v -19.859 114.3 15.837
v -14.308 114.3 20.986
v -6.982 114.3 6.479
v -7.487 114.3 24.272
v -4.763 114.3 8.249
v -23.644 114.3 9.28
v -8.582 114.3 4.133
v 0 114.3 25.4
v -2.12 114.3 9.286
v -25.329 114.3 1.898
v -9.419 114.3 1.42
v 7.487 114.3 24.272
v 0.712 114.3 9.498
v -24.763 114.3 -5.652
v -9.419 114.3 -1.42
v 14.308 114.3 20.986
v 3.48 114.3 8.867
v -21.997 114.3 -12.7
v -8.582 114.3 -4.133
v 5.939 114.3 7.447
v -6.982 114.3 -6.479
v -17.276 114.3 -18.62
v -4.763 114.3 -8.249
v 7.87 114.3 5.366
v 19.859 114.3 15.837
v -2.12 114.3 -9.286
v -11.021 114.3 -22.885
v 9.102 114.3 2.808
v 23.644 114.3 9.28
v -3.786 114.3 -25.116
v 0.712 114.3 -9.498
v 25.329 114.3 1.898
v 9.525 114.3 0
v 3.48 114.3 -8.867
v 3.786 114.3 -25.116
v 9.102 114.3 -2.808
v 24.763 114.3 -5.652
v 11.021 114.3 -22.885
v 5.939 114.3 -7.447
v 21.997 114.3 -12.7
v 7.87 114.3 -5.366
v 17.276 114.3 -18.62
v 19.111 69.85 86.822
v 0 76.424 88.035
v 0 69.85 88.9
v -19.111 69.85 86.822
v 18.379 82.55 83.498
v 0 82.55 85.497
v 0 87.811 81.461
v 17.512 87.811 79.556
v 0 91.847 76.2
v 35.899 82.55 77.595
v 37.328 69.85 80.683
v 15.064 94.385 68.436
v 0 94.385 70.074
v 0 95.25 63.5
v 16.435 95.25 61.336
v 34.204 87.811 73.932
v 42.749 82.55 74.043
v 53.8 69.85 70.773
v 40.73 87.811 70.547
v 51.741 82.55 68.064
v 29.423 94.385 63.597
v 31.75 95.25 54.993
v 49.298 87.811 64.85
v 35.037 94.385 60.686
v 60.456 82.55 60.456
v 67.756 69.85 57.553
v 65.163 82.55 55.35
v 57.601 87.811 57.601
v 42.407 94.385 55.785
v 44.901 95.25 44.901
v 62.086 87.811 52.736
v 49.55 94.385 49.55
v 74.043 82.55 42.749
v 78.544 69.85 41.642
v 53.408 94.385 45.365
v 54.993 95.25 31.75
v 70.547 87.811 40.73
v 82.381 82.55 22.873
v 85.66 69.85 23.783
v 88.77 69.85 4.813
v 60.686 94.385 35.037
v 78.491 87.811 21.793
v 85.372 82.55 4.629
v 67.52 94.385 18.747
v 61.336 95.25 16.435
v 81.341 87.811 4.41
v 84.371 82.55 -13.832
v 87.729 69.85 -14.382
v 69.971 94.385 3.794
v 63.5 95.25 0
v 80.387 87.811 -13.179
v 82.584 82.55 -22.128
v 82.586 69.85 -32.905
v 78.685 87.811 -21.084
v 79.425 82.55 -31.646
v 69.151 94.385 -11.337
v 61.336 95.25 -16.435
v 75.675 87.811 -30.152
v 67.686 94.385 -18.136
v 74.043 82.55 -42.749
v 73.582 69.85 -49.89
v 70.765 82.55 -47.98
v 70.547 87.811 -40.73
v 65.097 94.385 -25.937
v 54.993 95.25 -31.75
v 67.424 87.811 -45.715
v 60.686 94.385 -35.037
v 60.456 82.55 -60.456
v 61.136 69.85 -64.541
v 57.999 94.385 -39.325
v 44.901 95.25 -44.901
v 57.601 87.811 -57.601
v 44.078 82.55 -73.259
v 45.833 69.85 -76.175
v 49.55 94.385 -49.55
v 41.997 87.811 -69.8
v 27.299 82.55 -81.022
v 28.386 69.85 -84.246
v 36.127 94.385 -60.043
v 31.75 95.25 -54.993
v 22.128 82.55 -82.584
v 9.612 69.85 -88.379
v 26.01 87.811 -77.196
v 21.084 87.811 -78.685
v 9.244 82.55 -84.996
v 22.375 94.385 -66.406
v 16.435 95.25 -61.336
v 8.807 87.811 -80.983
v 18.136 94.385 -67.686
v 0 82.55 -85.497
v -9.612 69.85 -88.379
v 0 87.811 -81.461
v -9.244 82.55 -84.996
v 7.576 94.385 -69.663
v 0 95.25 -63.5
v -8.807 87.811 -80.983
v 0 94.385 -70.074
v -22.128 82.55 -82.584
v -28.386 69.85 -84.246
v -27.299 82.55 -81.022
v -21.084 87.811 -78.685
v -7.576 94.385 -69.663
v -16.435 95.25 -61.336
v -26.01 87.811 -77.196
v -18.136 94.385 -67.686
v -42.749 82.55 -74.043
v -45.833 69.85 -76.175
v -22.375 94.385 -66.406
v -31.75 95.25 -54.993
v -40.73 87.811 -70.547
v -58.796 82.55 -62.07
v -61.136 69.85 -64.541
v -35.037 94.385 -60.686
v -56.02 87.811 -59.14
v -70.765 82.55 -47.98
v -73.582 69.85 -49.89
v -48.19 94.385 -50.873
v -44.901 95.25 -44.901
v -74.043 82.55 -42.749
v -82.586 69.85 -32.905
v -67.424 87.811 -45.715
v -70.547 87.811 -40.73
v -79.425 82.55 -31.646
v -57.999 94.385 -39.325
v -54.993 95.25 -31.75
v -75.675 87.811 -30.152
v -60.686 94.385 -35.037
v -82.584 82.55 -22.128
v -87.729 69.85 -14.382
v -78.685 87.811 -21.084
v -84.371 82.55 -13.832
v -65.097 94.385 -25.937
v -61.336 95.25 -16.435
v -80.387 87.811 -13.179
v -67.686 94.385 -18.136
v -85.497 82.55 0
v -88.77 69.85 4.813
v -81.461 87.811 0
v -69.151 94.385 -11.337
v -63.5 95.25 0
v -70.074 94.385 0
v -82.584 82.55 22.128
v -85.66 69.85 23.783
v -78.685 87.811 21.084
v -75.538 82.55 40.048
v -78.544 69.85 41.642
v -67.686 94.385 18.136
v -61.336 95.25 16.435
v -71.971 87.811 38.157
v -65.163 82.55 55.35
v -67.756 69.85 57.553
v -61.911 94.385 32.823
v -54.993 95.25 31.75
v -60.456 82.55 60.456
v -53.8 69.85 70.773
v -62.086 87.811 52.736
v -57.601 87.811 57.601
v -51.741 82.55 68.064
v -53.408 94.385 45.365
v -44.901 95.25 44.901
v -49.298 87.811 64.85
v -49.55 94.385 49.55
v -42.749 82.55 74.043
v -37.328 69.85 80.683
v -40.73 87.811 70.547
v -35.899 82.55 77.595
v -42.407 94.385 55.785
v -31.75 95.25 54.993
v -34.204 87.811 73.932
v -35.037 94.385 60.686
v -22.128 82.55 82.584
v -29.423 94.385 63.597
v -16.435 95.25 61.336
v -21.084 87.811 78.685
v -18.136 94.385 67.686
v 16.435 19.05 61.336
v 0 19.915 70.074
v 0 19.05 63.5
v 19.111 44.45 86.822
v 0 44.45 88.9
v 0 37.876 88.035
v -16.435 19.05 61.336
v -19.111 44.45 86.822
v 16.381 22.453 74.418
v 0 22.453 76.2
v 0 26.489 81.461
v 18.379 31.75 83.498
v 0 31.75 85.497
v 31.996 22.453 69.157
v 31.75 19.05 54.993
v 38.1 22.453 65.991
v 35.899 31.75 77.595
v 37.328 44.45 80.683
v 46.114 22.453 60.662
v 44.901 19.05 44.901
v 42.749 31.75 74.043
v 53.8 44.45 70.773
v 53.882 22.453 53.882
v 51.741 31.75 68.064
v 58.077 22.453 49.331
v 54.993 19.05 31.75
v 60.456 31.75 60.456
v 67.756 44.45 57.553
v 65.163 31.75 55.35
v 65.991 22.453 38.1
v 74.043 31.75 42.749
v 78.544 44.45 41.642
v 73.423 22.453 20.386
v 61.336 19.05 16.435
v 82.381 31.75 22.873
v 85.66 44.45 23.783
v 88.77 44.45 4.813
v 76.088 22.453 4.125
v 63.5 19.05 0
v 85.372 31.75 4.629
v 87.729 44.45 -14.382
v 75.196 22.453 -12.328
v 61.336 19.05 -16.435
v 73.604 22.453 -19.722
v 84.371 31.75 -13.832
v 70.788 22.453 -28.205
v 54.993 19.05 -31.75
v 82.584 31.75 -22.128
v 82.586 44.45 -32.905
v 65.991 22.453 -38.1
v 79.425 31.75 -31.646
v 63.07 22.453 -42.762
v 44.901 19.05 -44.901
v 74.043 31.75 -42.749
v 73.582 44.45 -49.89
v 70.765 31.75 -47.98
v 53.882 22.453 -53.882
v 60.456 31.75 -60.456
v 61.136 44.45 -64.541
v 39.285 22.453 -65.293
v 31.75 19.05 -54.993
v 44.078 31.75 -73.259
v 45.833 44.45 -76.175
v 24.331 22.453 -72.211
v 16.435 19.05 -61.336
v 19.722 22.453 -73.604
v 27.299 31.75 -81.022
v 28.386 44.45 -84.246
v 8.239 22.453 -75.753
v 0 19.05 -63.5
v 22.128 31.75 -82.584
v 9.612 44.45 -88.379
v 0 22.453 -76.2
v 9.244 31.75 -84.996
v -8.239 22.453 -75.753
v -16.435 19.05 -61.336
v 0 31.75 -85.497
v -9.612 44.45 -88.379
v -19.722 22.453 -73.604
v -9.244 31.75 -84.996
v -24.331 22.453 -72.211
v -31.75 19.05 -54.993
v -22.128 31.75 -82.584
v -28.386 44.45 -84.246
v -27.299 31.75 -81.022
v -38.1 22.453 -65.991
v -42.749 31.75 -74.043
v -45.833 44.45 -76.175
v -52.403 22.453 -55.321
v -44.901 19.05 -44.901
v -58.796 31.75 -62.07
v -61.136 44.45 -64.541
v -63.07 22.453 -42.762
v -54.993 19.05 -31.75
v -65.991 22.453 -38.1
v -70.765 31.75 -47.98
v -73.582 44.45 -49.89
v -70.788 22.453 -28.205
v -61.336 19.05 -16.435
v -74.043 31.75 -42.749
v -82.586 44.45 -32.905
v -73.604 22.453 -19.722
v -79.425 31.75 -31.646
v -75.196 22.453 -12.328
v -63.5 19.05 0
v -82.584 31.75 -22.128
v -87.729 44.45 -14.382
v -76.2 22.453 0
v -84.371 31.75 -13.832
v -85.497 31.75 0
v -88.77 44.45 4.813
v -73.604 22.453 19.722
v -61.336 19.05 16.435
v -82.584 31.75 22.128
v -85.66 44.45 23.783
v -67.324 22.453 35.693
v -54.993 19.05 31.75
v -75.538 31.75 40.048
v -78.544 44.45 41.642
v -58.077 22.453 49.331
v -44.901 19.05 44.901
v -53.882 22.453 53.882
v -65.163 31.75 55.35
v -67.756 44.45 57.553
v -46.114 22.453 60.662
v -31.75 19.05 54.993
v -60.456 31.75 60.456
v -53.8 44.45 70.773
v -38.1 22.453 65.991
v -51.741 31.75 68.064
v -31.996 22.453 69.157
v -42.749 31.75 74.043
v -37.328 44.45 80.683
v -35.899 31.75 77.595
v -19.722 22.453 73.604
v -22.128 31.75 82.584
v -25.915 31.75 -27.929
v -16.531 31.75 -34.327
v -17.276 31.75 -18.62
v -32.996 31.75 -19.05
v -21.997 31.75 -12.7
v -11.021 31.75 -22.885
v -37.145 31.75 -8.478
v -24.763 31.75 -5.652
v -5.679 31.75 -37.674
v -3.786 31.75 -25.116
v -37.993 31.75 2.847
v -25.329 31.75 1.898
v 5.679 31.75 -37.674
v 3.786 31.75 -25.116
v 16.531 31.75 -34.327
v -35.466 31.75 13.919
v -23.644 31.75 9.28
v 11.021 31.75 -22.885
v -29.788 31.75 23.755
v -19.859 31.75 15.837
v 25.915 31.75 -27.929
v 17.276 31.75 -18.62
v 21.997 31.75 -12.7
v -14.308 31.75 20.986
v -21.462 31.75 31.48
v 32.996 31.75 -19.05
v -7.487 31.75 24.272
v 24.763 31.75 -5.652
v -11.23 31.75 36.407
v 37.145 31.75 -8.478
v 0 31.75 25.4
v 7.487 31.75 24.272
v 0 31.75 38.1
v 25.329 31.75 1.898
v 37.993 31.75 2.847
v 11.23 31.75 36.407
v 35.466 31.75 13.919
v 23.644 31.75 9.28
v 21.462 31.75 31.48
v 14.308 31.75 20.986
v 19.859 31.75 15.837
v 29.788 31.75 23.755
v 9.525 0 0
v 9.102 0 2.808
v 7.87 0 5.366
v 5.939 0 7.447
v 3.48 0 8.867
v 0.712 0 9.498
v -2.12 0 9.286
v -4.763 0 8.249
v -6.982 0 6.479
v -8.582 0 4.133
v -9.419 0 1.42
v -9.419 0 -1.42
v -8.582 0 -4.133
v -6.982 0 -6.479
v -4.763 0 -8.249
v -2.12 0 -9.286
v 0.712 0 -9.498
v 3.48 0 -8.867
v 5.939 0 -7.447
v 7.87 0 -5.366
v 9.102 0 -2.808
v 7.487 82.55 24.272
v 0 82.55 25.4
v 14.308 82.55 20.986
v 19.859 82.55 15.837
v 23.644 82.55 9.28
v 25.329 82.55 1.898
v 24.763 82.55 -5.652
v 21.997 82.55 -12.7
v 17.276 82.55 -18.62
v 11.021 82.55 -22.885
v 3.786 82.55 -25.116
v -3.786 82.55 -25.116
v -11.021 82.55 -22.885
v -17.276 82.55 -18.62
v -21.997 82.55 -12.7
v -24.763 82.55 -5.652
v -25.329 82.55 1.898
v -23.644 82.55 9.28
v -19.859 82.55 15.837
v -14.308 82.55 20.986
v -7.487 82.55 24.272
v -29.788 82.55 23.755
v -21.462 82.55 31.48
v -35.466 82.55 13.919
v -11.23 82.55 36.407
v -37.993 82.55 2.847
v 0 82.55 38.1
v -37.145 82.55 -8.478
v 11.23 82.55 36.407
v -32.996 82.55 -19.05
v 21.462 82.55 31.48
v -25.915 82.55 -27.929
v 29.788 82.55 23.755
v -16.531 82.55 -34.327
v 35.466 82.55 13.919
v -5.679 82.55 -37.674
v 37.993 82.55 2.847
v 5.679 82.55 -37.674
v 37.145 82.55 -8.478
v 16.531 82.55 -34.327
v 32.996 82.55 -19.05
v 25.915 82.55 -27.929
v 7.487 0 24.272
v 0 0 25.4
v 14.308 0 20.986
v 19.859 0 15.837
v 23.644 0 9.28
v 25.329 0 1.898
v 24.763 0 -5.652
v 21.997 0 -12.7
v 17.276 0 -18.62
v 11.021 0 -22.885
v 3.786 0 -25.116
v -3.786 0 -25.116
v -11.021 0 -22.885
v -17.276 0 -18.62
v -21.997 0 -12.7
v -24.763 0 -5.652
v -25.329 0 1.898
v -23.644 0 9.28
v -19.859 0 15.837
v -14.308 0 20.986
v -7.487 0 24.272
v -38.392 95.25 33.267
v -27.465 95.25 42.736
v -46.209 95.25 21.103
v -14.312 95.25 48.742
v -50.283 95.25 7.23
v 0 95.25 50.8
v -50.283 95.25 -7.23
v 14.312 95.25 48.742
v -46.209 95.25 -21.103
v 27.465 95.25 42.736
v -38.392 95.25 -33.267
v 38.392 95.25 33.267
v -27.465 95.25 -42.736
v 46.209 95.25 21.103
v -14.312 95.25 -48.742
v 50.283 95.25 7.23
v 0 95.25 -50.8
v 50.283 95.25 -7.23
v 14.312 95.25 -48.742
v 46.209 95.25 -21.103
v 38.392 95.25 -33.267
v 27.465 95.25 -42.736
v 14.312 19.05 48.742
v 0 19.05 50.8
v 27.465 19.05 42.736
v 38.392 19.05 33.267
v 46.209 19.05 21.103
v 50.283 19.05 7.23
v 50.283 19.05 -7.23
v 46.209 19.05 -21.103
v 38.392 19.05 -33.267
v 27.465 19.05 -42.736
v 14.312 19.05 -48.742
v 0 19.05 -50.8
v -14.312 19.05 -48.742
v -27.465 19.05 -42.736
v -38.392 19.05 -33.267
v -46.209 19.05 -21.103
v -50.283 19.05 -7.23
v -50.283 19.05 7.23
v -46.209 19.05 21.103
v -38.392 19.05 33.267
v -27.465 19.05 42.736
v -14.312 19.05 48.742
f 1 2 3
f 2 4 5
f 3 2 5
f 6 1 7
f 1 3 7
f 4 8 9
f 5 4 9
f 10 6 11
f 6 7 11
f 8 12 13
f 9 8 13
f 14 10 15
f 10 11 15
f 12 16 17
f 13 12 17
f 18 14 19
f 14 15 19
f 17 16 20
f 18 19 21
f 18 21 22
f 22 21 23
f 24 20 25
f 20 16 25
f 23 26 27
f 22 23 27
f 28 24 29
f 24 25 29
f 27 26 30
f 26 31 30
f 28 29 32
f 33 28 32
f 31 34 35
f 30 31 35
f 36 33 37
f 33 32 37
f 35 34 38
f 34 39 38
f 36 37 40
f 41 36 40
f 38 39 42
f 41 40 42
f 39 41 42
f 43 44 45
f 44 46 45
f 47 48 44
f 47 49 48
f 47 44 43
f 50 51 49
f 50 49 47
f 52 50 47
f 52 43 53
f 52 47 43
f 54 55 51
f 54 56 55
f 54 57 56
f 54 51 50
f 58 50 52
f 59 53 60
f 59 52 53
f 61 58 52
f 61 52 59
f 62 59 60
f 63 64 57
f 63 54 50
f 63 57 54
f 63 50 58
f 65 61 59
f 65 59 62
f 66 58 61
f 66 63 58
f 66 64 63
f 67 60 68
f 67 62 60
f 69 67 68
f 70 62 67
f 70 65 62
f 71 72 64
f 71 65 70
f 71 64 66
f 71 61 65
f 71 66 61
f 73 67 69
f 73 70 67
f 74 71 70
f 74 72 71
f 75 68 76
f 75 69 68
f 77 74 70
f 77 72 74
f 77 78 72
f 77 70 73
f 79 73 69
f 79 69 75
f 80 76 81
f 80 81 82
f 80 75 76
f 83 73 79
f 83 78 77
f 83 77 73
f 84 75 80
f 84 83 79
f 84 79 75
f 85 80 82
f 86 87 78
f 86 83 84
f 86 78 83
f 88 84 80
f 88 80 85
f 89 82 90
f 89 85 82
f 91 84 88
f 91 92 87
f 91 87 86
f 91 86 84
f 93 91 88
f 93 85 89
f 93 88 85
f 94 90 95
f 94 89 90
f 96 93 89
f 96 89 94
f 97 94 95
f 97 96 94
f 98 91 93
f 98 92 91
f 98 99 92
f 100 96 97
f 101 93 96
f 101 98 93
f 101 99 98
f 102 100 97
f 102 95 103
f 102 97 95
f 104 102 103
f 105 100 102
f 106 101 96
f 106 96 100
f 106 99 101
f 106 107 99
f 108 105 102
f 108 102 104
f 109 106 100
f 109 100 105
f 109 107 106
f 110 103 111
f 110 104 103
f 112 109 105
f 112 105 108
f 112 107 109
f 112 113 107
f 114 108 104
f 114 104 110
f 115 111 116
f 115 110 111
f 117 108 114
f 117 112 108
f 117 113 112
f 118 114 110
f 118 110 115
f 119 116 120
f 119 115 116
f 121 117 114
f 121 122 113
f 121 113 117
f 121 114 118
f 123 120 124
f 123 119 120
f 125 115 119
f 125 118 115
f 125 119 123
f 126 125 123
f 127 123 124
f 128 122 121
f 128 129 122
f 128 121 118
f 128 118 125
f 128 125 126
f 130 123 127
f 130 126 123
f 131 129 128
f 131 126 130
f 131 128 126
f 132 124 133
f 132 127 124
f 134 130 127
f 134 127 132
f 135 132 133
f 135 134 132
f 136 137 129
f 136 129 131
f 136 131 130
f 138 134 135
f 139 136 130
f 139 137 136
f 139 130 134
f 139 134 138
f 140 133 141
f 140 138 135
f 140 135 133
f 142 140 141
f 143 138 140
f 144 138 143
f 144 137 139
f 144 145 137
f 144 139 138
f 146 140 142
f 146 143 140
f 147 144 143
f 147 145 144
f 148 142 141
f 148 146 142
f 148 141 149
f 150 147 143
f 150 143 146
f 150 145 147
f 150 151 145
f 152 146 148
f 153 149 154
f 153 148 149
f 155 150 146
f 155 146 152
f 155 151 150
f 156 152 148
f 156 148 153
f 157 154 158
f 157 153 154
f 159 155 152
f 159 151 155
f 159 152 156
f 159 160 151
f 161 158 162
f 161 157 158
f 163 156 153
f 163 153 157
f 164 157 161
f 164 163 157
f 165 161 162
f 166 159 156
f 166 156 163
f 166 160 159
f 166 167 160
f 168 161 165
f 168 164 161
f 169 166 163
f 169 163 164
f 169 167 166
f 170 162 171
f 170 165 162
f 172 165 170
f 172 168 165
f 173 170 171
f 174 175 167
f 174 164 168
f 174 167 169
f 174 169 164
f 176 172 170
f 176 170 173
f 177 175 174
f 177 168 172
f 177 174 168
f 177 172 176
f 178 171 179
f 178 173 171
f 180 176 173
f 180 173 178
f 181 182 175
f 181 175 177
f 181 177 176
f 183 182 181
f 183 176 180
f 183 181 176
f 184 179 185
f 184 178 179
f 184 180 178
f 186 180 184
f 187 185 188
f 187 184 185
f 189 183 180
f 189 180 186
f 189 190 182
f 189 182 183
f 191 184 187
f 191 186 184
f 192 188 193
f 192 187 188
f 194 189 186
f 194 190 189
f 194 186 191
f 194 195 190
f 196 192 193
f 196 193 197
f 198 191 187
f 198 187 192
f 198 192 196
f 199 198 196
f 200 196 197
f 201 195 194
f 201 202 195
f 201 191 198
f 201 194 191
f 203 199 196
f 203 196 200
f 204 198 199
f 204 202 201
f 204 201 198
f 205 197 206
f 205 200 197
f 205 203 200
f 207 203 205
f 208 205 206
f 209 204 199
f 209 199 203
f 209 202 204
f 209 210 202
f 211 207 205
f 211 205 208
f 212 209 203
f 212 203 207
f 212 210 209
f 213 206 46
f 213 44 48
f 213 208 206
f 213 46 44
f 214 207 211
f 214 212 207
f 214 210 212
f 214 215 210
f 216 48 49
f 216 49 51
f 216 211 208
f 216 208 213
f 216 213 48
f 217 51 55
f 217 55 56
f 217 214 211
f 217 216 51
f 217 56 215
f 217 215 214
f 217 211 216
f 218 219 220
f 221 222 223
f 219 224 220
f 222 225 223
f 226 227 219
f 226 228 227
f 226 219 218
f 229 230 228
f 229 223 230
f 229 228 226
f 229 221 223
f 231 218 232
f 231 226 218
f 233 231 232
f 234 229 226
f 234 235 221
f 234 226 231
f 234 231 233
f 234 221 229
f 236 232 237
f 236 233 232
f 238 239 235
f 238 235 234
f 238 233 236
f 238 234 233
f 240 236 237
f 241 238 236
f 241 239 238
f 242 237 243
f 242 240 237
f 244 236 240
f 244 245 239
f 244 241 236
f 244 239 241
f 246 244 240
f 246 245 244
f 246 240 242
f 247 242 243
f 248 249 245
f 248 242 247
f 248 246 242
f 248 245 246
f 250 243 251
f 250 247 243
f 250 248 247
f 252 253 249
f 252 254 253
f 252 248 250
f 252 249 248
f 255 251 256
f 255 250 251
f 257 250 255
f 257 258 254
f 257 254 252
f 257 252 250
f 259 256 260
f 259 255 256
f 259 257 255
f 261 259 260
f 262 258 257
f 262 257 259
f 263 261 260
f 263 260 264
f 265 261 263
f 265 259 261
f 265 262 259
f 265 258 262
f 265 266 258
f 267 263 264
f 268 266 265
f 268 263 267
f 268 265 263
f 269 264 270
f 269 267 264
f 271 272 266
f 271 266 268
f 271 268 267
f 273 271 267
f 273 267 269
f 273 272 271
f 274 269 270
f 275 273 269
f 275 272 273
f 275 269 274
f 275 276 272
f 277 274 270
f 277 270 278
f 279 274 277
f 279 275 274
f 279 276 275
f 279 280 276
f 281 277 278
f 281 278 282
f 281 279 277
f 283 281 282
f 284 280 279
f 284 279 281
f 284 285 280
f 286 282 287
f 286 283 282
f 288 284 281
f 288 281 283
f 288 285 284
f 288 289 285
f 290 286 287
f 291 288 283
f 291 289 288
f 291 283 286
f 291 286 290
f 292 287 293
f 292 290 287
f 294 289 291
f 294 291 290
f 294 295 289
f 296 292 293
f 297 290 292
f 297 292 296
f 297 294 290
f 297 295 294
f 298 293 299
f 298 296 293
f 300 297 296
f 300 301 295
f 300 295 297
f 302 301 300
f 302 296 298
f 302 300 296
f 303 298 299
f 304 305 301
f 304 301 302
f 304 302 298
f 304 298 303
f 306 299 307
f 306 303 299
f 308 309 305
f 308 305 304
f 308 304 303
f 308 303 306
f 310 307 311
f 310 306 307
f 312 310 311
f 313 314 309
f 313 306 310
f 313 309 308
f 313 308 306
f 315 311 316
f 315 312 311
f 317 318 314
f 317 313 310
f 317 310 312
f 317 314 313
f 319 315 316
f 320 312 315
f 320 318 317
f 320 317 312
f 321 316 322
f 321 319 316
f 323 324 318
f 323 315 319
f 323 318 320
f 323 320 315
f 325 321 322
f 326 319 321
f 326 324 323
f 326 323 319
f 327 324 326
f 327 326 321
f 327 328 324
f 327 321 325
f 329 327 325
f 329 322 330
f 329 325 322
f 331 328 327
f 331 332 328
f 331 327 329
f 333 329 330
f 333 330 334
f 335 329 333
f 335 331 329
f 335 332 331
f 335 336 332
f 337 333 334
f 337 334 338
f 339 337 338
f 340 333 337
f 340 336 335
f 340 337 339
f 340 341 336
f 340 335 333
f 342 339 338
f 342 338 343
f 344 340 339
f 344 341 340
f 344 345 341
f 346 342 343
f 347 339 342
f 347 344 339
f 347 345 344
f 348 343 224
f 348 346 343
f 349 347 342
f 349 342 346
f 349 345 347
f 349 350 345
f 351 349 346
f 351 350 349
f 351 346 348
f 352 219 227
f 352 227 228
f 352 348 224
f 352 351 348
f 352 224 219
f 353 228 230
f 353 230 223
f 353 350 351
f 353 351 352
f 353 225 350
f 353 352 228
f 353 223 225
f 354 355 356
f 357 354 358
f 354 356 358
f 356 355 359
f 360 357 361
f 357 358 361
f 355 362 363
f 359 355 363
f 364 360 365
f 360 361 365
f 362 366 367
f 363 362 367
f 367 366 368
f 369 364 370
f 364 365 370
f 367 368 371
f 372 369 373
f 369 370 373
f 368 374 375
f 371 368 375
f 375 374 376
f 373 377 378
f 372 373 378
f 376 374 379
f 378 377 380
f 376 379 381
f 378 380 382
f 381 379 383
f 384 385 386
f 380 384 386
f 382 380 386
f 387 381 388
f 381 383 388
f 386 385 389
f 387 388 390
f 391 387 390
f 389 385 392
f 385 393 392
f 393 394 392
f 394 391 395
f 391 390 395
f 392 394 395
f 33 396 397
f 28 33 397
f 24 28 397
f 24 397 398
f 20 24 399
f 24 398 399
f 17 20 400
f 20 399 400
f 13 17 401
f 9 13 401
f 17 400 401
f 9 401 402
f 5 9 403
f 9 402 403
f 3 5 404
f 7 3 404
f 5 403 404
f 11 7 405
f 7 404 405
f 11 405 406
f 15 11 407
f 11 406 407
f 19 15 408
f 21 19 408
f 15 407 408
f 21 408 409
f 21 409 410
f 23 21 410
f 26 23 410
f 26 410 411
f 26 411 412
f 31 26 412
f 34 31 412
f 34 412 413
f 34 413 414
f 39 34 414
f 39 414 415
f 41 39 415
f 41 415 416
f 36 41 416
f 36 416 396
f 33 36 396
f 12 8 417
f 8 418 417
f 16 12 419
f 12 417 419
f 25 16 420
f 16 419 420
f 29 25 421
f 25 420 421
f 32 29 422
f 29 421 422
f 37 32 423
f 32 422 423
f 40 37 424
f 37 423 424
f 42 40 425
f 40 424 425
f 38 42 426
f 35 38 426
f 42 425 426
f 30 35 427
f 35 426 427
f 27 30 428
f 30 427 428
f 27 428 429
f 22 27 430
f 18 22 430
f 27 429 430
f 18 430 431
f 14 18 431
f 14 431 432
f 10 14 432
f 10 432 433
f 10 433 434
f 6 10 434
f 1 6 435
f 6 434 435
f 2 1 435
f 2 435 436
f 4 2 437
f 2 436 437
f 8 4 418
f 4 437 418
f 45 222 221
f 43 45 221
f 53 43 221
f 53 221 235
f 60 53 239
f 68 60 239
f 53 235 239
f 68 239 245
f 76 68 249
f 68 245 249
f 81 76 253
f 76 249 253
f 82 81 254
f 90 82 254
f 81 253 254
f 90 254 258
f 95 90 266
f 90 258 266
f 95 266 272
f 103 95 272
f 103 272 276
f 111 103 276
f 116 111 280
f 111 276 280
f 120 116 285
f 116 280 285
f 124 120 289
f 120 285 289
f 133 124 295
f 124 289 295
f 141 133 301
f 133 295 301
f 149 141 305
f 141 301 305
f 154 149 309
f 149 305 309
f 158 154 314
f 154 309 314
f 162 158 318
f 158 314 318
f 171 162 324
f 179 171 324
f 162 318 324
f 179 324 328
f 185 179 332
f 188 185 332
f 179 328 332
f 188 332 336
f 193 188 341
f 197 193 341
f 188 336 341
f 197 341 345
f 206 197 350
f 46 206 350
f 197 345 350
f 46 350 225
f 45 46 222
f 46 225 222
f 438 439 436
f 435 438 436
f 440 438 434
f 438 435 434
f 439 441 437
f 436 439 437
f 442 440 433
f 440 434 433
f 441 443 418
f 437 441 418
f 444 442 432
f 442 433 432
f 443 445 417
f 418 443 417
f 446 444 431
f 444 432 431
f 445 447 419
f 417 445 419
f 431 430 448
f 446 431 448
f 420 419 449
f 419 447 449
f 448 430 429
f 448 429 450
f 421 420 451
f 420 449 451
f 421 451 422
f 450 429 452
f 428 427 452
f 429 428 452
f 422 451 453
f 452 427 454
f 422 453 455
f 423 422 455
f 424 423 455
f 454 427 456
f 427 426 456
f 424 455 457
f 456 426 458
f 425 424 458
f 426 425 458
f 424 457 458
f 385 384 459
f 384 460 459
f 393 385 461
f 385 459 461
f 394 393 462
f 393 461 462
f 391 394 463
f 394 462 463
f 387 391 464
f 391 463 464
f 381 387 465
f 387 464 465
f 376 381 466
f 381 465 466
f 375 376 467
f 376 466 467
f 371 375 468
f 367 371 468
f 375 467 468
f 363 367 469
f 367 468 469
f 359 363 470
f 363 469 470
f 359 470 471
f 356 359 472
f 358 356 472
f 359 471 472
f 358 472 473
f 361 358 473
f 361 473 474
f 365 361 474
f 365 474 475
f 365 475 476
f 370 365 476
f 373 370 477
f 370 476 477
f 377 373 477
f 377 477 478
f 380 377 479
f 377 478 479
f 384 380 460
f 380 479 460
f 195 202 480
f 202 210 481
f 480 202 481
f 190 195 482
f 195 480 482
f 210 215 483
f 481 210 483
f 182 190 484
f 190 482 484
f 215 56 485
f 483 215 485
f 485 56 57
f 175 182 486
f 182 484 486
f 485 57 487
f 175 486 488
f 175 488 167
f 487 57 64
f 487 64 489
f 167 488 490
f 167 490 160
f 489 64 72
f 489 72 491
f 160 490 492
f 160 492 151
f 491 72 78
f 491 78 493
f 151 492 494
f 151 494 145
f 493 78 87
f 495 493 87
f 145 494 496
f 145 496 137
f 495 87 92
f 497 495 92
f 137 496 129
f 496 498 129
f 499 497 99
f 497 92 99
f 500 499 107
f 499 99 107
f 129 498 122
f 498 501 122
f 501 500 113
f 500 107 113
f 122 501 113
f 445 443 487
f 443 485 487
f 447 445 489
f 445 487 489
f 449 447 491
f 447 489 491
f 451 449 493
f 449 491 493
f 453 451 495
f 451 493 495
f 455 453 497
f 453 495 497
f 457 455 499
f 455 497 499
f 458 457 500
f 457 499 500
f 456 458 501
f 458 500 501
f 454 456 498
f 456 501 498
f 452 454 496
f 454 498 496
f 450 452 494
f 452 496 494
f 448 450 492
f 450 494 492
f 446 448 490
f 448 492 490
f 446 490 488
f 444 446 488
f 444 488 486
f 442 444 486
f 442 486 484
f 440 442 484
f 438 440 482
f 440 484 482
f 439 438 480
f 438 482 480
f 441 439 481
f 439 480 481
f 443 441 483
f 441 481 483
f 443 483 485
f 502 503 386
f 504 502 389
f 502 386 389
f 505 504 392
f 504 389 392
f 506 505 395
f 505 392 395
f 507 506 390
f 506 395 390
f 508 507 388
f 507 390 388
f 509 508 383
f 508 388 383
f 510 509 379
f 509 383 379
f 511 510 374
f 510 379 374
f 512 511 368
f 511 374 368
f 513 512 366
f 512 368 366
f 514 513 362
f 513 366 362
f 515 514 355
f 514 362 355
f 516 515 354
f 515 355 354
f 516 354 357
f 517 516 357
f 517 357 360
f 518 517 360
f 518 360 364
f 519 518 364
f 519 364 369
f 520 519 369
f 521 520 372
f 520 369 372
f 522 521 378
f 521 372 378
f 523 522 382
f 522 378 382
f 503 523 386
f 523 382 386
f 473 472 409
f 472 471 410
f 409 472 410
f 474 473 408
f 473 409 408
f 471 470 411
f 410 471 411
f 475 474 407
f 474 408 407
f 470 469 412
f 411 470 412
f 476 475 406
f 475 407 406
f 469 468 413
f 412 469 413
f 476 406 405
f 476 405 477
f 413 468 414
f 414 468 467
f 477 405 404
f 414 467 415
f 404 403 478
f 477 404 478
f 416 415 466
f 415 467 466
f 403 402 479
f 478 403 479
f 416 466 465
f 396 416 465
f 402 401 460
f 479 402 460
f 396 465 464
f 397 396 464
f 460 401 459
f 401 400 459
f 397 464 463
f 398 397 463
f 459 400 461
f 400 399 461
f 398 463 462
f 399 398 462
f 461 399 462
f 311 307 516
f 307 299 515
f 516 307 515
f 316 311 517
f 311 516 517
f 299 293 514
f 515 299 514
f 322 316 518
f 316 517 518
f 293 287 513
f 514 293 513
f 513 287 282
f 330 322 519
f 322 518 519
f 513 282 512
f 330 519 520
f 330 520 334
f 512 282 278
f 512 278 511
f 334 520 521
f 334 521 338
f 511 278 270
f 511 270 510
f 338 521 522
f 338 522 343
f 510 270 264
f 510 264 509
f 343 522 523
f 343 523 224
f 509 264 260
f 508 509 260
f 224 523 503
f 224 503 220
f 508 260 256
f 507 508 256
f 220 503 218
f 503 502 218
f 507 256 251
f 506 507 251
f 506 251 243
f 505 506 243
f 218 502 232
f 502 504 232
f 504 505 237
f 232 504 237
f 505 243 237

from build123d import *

# Parameters (mm, degrees)
F3_D = 19.05
F4_R = 25.4


with BuildPart() as f1:
    # F0 (on Right) → F1 (revolve)
    with BuildSketch(Plane.YZ):
        Polygon((0, 25.4), (0, 0), (114.3, 0), (114.3, 25.4), (82.55, 25.4), (82.55, 38.1), (95.25, 50.8), (95.25, 88.9), (19.05, 88.9), (19.05, 50.8), (31.75, 38.1), (31.75, 25.4), align=None)
    revolve(axis=Axis((0, 77.023387, 0), (0, 1, 0)))

    # F3 (through all)
    with Locations(Plane(origin=(0, 114.3, 0), x_dir=(-1, 0, 0), z_dir=(0, 1, 0))):
        with Locations((0, 0)):
            Hole(F3_D / 2)

    # F4
    f4_edges = [f1.edges().sort_by_distance(p)[0] for p in [
        (0, 95.25, -88.9),
        (0, 19.05, -88.9),
    ]]
    fillet(f4_edges, radius=F4_R)


solid = f1.part
